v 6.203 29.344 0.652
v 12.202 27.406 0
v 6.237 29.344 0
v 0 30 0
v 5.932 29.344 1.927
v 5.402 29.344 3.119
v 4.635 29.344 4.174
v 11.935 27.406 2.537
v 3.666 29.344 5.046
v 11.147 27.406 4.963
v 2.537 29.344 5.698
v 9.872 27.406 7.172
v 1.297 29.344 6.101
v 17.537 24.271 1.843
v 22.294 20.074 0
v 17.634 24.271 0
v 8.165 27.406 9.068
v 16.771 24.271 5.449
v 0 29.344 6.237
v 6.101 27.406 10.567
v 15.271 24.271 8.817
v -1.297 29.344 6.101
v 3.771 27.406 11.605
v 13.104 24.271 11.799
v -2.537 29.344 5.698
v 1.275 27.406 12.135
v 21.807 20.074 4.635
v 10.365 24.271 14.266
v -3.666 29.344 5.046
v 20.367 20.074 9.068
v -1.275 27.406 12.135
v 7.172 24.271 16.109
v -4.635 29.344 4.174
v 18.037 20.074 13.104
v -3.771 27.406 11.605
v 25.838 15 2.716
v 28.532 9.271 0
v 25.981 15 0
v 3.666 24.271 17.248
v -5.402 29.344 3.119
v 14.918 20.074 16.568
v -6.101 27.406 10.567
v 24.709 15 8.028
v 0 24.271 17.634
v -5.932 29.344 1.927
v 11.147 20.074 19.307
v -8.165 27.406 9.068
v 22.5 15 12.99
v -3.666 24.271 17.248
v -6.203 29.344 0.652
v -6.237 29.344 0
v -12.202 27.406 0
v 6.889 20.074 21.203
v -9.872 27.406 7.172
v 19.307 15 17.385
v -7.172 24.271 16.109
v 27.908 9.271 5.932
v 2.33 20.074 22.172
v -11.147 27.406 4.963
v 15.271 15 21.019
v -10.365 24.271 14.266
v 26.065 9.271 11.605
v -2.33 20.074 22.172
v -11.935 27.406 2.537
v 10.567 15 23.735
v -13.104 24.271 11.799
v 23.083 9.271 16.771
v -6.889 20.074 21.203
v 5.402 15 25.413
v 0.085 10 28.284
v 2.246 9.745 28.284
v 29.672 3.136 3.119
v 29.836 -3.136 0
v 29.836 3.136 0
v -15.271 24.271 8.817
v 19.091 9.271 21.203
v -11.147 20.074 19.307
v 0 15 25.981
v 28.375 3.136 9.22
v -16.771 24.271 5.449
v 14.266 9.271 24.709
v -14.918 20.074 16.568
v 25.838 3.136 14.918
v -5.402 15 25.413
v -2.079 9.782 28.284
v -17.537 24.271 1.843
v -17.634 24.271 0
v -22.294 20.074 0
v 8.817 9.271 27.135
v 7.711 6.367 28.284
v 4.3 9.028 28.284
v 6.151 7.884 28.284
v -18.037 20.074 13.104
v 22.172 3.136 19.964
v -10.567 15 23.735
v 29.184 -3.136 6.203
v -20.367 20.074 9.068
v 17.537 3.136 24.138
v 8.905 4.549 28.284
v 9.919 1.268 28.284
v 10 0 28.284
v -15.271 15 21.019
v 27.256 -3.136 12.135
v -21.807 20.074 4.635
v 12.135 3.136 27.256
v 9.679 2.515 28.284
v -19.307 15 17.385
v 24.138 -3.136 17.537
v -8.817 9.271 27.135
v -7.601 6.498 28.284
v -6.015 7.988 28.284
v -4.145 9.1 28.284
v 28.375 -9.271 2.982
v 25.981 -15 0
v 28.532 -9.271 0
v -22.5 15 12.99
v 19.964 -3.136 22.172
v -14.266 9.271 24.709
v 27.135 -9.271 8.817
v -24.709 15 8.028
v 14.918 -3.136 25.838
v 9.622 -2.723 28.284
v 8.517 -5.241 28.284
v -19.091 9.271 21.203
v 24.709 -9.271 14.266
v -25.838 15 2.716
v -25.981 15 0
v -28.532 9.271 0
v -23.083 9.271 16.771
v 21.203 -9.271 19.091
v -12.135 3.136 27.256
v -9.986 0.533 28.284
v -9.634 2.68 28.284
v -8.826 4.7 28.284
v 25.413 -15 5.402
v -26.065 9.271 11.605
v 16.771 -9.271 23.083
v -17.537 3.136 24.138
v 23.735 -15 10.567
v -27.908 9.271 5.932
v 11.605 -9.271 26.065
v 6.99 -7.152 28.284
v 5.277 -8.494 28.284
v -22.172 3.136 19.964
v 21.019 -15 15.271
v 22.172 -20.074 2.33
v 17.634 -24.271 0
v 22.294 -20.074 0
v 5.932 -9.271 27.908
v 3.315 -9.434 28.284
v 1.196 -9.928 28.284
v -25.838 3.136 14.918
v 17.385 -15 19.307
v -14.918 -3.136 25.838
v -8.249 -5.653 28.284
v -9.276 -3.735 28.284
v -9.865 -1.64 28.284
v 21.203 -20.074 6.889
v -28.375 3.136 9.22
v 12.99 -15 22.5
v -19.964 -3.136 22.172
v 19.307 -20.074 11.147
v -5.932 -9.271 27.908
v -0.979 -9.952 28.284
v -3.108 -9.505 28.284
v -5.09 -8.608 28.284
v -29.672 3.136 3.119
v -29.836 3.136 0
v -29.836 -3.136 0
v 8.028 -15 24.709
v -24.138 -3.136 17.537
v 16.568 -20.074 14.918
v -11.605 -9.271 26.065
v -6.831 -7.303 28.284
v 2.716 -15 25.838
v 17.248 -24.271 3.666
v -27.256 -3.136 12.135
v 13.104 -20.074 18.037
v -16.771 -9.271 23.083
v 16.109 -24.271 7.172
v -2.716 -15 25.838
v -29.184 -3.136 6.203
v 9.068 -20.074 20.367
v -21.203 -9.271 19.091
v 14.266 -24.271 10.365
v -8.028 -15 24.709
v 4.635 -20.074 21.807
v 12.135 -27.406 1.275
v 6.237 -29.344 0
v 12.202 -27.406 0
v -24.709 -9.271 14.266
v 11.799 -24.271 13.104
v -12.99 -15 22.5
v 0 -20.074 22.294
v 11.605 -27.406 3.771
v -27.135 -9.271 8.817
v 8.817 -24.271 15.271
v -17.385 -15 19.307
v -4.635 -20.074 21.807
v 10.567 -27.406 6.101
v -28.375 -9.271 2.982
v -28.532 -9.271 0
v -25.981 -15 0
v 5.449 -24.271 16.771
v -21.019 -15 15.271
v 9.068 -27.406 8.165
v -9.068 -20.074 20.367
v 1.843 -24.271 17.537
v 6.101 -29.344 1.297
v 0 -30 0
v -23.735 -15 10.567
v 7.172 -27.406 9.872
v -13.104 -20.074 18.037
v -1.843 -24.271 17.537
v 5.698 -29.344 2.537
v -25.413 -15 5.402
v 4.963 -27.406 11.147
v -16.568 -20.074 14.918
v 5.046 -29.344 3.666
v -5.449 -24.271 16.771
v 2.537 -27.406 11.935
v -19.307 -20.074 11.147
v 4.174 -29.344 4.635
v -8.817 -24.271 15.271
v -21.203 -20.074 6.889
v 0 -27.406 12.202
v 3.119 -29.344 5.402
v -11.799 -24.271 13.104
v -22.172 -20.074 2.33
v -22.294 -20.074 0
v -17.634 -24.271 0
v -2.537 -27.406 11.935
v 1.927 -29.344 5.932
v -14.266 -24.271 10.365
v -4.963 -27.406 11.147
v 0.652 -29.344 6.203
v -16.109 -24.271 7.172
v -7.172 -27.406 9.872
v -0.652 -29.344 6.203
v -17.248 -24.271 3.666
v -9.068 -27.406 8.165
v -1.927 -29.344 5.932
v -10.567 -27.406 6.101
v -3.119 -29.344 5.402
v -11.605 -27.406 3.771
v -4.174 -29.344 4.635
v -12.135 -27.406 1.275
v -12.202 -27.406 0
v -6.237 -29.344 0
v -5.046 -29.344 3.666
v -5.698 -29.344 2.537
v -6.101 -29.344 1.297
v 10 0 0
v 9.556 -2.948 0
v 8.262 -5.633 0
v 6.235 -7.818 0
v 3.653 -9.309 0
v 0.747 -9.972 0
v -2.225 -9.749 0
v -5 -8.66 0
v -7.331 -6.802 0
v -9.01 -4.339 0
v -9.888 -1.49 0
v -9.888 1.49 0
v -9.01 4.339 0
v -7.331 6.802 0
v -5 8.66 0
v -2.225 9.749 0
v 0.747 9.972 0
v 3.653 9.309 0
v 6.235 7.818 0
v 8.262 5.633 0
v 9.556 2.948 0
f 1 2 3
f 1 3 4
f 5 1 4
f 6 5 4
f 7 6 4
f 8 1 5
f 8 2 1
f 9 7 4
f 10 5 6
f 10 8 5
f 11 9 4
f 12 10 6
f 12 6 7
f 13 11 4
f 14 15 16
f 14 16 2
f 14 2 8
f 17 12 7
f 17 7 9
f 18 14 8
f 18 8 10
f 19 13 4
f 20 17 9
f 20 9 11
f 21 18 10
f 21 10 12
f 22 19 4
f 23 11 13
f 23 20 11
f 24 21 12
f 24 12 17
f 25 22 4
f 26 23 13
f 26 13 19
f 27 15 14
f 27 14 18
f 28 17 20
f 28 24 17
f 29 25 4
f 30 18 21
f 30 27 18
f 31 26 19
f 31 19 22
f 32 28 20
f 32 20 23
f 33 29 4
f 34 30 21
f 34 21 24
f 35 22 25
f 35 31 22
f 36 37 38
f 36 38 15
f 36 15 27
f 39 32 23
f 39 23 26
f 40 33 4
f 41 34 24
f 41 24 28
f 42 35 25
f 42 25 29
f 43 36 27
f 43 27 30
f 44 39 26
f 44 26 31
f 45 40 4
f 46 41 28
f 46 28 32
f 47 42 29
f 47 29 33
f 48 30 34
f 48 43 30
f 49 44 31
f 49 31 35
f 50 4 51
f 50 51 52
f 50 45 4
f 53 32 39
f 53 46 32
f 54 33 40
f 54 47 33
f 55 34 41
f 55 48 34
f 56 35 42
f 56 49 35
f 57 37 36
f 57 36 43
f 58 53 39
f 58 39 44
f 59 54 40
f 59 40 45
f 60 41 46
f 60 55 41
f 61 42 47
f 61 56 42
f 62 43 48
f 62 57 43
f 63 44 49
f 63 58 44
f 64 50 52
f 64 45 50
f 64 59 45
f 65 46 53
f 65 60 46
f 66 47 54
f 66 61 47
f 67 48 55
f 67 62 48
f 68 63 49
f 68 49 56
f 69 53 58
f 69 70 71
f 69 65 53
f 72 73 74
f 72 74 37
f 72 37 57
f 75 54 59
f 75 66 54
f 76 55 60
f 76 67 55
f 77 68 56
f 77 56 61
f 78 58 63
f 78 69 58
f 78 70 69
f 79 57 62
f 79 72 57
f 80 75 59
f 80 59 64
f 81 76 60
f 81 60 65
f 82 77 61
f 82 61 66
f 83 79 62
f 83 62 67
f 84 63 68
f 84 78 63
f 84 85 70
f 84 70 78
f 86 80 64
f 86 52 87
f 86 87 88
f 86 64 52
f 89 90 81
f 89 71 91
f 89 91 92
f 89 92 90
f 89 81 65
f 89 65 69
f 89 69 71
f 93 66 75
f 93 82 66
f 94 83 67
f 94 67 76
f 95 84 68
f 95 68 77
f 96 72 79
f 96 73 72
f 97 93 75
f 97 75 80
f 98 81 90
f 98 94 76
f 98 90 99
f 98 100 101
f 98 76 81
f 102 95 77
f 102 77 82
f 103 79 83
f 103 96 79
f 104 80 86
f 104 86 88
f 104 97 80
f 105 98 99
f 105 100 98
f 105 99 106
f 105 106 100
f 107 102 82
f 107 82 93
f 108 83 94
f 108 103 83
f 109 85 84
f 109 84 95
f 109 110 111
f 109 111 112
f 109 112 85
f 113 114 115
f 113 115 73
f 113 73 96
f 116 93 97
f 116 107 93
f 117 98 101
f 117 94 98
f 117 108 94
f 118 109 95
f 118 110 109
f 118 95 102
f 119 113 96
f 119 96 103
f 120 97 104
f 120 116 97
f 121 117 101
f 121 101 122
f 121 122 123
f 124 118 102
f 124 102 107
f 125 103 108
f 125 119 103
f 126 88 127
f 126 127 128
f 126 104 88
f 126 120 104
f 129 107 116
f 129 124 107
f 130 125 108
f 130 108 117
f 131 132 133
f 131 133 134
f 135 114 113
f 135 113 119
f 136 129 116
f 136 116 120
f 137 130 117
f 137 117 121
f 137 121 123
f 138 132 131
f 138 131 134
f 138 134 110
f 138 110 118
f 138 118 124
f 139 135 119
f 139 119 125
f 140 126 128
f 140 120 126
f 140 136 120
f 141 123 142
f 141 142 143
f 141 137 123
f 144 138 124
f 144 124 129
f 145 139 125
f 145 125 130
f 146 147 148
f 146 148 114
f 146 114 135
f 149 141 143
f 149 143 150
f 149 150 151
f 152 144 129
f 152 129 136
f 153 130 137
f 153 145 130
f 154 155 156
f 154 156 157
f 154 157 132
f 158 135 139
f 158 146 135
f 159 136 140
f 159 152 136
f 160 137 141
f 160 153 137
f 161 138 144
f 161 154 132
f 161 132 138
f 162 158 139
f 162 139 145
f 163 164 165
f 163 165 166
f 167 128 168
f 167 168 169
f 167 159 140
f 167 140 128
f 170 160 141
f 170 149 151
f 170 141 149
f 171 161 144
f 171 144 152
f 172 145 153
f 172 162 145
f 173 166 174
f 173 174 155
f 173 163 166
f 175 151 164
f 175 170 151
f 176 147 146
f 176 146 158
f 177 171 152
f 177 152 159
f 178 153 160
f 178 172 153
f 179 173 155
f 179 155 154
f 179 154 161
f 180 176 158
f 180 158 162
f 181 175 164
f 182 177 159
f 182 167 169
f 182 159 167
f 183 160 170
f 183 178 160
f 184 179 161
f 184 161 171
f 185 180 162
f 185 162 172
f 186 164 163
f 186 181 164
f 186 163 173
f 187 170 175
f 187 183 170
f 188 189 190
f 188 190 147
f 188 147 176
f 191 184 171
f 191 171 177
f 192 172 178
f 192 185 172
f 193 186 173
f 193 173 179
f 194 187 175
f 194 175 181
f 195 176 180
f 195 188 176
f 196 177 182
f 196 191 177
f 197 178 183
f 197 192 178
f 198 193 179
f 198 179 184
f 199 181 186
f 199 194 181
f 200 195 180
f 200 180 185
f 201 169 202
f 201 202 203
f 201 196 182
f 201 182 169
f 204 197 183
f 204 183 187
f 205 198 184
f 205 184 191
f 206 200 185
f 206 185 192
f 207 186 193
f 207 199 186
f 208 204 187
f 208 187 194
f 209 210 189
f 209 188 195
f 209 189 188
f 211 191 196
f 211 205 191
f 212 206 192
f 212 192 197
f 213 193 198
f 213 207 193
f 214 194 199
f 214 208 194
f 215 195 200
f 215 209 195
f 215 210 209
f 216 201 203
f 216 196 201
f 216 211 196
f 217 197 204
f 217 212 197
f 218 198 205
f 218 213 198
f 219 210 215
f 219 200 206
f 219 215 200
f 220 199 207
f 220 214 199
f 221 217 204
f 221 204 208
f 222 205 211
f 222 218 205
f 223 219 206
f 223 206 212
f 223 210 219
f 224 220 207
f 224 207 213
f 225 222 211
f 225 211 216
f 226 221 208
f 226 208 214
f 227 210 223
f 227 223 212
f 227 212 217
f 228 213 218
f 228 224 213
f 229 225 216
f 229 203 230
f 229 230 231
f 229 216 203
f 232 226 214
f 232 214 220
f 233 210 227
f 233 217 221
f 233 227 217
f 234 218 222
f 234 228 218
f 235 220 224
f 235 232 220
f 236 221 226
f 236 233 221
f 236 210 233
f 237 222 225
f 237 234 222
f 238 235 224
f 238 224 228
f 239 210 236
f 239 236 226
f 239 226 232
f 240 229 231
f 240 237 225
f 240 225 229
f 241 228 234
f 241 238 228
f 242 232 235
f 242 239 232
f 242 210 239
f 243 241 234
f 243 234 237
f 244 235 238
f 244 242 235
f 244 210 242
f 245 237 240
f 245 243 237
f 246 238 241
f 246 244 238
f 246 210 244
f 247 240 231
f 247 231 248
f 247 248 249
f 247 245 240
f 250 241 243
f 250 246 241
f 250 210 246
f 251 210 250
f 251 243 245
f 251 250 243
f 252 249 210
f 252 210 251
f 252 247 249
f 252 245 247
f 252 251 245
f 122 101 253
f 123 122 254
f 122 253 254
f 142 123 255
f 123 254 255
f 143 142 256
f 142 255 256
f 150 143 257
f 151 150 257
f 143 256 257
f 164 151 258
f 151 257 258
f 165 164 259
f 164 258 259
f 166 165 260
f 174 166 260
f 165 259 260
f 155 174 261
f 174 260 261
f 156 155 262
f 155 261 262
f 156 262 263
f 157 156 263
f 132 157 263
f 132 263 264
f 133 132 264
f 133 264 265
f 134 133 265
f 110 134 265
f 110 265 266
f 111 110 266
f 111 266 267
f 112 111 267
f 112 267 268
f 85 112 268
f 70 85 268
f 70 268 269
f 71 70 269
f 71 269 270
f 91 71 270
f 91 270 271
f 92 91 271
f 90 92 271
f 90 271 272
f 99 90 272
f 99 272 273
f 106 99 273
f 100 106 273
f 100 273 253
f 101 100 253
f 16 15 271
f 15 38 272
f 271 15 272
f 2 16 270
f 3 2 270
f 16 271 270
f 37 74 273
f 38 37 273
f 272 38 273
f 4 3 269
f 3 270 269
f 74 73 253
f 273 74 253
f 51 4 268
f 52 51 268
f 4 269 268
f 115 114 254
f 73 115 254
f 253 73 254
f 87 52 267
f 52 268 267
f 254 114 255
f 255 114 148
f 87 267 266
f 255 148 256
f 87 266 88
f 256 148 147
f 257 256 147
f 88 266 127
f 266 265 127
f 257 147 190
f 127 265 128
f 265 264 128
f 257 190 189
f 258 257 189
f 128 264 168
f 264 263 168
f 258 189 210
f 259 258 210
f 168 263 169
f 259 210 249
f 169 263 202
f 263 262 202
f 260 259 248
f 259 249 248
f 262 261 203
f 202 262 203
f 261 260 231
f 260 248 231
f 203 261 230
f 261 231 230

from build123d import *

# Parameters (mm, degrees)
F4_DEPTH = 30
F5_R     = 10
F6_DEPTH = 60


with BuildPart() as f2:
    # F0 (on Top) → F2 (revolve)
    with BuildSketch(Plane.XY):
        with BuildLine():
            Line((0, -30), (0, 30))
            ThreePointArc((0, 30), (-30, 0), (0, -30))
        make_face()
    revolve(axis=Axis((0, 0, 0), (0, -1, 0)))

    # F3 (on Front) → F4 (cut, symmetric)
    with BuildSketch(Plane.XZ):
        with BuildLine():
            Line((30, 0), (-30, 0))
            ThreePointArc((-30, 0), (0, -30), (30, 0))
        make_face()
    extrude(amount=F4_DEPTH, both=True, mode=Mode.SUBTRACT)

    # F5 (on face) → F6 (cut)
    with BuildSketch(Plane(origin=(0, 0, 0), x_dir=(1, 0, 0), z_dir=(0, 0, -1))):
        Circle(F5_R)
    extrude(amount=-F6_DEPTH, mode=Mode.SUBTRACT)


solid = f2.part
